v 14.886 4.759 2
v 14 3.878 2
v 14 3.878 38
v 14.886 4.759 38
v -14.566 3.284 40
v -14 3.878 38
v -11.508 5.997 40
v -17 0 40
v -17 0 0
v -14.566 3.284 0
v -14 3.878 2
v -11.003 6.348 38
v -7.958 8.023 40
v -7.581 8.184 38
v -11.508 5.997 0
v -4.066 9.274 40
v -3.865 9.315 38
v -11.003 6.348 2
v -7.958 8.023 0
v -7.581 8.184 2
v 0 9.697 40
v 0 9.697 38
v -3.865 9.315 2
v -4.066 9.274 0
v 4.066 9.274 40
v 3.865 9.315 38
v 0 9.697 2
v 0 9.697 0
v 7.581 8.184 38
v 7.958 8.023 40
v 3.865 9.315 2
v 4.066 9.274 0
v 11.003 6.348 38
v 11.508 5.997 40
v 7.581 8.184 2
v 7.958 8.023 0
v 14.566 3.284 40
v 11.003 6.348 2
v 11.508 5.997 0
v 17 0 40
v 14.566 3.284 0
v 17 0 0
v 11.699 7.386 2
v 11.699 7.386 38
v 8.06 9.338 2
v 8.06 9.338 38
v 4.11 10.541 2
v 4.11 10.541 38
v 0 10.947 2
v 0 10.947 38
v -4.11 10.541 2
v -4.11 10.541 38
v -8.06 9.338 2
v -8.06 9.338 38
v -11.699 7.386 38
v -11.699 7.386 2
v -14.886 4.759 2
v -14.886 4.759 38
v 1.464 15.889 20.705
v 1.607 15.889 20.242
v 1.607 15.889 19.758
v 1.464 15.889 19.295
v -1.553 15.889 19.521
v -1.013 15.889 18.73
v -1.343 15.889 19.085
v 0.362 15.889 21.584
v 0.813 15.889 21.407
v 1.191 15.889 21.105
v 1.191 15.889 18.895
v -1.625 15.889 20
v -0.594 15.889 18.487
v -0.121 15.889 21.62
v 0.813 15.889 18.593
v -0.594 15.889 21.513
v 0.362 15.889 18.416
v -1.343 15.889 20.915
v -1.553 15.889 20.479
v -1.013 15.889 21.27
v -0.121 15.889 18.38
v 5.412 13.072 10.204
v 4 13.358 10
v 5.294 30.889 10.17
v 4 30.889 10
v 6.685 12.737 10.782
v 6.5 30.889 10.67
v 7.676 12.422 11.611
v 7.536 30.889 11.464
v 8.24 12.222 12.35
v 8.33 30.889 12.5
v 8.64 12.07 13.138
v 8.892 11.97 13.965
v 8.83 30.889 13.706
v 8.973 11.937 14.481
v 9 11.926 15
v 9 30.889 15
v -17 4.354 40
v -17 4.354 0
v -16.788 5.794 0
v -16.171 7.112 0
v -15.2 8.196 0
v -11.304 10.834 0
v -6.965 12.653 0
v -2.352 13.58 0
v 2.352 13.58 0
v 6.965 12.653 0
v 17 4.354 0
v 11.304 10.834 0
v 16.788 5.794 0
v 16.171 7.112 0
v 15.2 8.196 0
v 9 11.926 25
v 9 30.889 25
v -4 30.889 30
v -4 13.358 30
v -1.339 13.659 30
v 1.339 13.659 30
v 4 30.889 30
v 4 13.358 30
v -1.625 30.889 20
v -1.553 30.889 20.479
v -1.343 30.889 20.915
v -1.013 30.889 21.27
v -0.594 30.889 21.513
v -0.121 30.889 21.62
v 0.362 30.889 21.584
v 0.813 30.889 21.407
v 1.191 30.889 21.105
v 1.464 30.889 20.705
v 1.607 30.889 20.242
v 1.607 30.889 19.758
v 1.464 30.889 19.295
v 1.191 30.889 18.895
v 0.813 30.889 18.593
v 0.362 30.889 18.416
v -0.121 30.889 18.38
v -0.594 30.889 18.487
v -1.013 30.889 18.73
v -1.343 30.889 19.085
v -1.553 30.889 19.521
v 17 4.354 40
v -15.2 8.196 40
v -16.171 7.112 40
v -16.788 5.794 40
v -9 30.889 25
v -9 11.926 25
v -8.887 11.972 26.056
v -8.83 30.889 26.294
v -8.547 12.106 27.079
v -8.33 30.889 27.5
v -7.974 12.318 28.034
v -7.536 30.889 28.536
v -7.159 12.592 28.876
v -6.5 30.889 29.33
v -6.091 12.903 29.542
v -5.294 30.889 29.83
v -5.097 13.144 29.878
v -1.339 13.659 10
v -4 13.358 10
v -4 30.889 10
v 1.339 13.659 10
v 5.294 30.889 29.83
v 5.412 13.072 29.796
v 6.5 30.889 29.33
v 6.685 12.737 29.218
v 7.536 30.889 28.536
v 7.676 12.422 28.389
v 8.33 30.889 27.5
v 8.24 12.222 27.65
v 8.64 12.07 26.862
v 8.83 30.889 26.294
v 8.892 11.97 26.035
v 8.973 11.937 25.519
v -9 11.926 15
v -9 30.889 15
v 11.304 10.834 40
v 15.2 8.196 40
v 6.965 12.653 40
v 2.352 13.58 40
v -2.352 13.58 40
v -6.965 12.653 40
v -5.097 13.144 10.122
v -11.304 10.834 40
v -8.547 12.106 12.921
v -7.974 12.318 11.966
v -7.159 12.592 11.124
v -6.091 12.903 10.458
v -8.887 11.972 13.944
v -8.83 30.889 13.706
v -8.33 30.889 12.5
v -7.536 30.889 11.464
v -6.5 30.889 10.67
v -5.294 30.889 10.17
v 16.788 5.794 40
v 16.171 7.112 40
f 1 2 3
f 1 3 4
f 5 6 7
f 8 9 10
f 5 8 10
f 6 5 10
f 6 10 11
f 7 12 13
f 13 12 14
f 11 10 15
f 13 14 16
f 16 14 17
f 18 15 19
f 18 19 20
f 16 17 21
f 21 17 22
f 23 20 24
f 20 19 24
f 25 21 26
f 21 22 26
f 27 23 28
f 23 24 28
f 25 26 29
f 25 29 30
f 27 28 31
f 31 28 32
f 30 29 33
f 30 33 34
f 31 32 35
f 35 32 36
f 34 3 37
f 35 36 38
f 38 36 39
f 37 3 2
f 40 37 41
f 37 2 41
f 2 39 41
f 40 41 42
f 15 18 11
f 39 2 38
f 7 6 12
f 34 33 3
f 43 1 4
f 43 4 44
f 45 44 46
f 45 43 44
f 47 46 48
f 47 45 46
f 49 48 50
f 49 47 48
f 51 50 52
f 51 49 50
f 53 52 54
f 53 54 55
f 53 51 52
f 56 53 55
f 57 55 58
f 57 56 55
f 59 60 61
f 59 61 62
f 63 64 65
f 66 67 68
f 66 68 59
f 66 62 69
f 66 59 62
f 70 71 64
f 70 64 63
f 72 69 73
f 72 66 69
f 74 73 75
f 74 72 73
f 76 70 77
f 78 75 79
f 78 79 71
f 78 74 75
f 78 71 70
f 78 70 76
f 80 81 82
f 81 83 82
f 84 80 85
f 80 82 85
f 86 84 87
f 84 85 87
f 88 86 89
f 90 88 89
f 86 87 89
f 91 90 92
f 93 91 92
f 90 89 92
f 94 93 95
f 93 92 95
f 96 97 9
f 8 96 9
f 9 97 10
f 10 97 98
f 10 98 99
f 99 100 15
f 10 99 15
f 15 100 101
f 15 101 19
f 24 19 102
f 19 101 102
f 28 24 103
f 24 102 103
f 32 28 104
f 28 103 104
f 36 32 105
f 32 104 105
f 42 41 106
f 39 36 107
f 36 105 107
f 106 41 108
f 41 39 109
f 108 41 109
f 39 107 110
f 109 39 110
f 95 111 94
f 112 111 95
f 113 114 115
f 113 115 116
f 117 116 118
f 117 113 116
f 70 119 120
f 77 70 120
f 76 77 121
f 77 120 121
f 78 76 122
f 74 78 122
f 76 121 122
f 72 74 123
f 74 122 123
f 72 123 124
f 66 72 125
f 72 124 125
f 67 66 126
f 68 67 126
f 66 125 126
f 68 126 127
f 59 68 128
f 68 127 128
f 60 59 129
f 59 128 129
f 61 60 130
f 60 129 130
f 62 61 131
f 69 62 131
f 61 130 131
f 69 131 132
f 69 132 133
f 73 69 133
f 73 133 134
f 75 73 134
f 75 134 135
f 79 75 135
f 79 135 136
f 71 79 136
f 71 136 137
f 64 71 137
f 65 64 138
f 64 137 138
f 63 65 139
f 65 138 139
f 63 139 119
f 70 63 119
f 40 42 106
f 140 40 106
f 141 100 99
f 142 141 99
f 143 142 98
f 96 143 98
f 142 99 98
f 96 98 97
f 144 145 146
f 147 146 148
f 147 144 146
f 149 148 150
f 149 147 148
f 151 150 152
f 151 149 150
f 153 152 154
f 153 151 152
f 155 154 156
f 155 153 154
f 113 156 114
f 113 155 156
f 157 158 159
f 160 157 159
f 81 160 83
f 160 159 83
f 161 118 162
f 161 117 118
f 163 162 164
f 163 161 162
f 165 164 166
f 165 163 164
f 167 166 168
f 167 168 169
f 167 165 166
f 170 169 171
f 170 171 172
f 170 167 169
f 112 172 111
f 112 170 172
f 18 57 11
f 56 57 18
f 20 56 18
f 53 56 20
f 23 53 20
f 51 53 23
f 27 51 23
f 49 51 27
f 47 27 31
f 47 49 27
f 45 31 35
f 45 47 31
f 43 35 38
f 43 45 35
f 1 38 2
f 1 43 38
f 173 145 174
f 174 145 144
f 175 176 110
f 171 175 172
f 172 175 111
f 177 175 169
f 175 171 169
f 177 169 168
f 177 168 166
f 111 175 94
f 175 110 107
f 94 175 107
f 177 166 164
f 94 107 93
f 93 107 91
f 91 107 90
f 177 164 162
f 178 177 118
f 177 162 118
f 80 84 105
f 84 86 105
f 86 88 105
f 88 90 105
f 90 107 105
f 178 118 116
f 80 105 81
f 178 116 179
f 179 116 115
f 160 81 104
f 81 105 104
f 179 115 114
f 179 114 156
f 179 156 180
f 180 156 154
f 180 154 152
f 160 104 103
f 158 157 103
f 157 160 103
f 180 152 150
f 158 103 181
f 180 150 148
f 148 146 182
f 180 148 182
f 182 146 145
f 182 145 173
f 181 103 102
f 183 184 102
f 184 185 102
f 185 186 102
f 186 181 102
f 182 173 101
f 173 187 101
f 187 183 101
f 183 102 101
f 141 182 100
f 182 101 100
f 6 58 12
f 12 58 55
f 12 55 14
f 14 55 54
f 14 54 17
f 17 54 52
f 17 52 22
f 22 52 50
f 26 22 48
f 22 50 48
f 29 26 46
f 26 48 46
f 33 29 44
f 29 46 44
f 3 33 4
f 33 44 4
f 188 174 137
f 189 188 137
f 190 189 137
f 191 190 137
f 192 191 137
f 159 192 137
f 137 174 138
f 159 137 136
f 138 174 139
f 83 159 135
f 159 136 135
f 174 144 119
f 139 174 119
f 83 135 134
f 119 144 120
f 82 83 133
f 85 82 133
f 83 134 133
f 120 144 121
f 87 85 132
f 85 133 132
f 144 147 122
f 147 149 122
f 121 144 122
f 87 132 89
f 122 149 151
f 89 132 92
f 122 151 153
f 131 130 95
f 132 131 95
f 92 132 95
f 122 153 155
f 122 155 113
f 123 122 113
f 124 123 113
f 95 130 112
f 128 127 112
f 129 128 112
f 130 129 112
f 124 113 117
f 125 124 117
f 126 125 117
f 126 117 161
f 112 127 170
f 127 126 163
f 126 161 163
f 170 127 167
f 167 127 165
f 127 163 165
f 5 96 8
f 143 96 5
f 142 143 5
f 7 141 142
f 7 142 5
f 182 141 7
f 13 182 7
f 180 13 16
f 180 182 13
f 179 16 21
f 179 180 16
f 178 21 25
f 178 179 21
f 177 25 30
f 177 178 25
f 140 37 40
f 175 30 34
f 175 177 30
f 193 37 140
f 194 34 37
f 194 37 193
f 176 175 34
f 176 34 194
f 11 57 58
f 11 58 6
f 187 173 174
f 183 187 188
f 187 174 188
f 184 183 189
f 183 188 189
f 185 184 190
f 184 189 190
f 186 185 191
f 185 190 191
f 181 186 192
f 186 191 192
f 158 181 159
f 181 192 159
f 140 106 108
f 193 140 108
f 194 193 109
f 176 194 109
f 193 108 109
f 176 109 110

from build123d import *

# Parameters (mm, degrees)
F1_DEPTH      = 40
F3_W          = 18
F3_H          = 20
F4_DEPTH      = 10
F4_DEPTH_BACK = 10
F7_DEPTH      = 36
F8_R          = 1.625
F9_DEPTH      = 15
F10_R         = 5


with BuildPart() as f1:
    # F0 (on Top) → F1 (new body)
    with BuildSketch(Plane.XY):
        with BuildLine():
            ThreePointArc((-17, 0), (0, 9.697015), (17, 0))
            Line((17, 0), (17, 4.354045))
            ThreePointArc((17, 4.354045), (16.527693, 6.475365), (15.2, 8.195919))
            ThreePointArc((15.2, 8.195919), (0, 13.697015), (-15.2, 8.195919))
            ThreePointArc((-15.2, 8.195919), (-16.527693, 6.475365), (-17, 4.354045))
            Line((-17, 4.354045), (-17, 0))
        make_face()
    extrude(amount=F1_DEPTH)

    # F3 (on offset) → F4 (join, two sides)
    with BuildSketch(Plane.XY.offset(20)) as f4_sk:
        with Locations((0, 20.889152)):
            Rectangle(F3_W, F3_H)
    extrude(amount=F4_DEPTH)
    extrude(f4_sk.sketch, amount=-F4_DEPTH_BACK)

    # F6 (on offset) → F7 (cut)
    with BuildSketch(Plane.XY.offset(2)):
        with BuildLine():
            Line((14, 3.877647), (14.886076, 4.759333))
            ThreePointArc((14.886076, 4.759333), (0, 10.947015), (-14.886076, 4.759333))
            Line((-14.886076, 4.759333), (-14, 3.877647))
            ThreePointArc((-14, 3.877647), (0, 9.697015), (14, 3.877647))
        make_face()
    extrude(amount=F7_DEPTH, mode=Mode.SUBTRACT)

    # F8 (on face) → F9 (cut)
    with BuildSketch(Plane(origin=(0, 30.889152, 0), x_dir=(-1, 0, 0), z_dir=(0, 1, 0))):
        with Locations((0, 20)):
            Circle(F8_R)
    extrude(amount=-F9_DEPTH, mode=Mode.SUBTRACT)

    # F10
    f10_edges = [f1.edges().sort_by_distance(p)[0] for p in [
        (9, 21.407425, 30),
        (-9, 21.407425, 30),
        (-9, 21.407425, 10),
        (9, 21.407425, 10),
    ]]
    fillet(f10_edges, radius=F10_R)


solid = f1.part
